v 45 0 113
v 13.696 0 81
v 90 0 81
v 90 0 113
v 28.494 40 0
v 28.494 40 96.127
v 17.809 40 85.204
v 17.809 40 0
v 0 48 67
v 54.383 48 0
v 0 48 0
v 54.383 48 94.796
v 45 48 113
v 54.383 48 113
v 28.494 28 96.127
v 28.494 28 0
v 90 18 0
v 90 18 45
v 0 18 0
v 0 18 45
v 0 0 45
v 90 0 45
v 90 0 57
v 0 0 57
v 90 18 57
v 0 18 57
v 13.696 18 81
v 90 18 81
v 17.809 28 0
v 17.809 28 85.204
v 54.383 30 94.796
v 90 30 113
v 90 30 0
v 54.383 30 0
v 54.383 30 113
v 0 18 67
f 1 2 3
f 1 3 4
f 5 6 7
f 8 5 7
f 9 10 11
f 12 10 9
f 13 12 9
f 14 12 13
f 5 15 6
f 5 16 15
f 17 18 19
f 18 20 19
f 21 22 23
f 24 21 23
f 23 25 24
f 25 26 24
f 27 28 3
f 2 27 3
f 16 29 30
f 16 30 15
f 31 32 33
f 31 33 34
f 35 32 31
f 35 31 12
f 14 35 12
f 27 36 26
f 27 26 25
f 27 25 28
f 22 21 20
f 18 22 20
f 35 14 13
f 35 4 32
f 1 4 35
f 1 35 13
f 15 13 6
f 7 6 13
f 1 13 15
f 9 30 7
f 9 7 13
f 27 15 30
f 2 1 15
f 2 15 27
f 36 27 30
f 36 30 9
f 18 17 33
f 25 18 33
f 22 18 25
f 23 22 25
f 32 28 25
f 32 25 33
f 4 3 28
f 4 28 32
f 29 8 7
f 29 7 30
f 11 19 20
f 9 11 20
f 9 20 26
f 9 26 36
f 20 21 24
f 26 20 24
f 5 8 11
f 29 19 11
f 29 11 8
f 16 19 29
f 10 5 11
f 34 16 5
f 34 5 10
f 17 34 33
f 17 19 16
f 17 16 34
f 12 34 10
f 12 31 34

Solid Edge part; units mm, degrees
sketch "Sketch1" plane through (0, 0, 0) normal (0, -1, 0) x (1, 0, 0)
  line L0 (0, 0) -> (0, 67)
  line L1 (45, 113) -> (0, 67)
  line L2 (90, 113) -> (45, 113)
  line L3 (90, 0) -> (90, 113)
  line L4 (0, 0) -> (90, 0)
extrude "Protrusion1" add sketch "Sketch1" against normal blind 48
sketch "Sketch2" plane through (0, 24, 33.5) normal (-1, 0, 0) x (0, -1, 0)
  line L0 (6, 47.5) -> (31.2141, 47.5)
  line L1 (31.2141, 23.5) -> (31.2141, 47.5)
  line L2 (6, 23.5) -> (31.2141, 23.5)
  line L3 (6, 23.5) -> (6, 47.5)
extrude "ExtrudedCutout_5" cut sketch "Sketch2" against normal blind 119.7329
sketch "Sketch3" plane through (0, 24, 33.5) normal (-1, 0, 0) x (0, -1, 0)
  line L0 (24, 11.5) -> (6, 11.5)
  line L1 (6, 11.5) -> (6, -33.5)
  line L2 (6, -33.5) -> (6, -39.0842)
  line L3 (6, -39.0842) -> (32.5581, -39.0842)
  line L4 (32.5581, 11.5) -> (32.5581, -39.0842)
  line L5 (24, 11.5) -> (32.5581, 11.5)
extrude "ExtrudedCutout_7" cut sketch "Sketch3" against normal blind 121.1095
sketch "Sketch4" plane through (45, 24, 90) normal (-0.4551, 0, 0.8904) x (0, -1, 0)
  line L0 (-6, 50.5371) -> (-6, 10.5371)
  line L1 (-6, 10.5371) -> (-33.3902, 10.5371)
  line L2 (-33.3902, 10.5371) -> (-33.3902, 50.5371)
  line L3 (-33.3902, 50.5371) -> (-6, 50.5371)
extrude "ExtrudedCutout_8" cut sketch "Sketch4" against normal blind 192.3862
sketch "Sketch5" plane through (45, 33, 0) normal (0, 0, -1) x (0, -1, 0)
  line L0 (-7, 27.1913) -> (5, 27.1913)
  line L1 (5, 27.1913) -> (5, 16.5061)
  line L2 (5, 16.5061) -> (-7, 16.5061)
  line L3 (-7, 16.5061) -> (-7, 27.1913)
extrude "ExtrudedCutout_9" cut sketch "Sketch5" against normal blind 129.7045
sketch "Sketch6" plane through (67.5, 24, 113) normal (0, 0, 1) x (0, -1, 0)
  line L0 (-6, 22.5) -> (-6, -13.1174)
  line L1 (-6, -13.1174) -> (-33.3902, -13.1174)
  line L2 (-33.3902, -13.1174) -> (-33.3902, 22.5)
  line L3 (-33.3902, 22.5) -> (-6, 22.5)
extrude "ExtrudedCutout_10" cut sketch "Sketch6" against normal blind 144.9371
